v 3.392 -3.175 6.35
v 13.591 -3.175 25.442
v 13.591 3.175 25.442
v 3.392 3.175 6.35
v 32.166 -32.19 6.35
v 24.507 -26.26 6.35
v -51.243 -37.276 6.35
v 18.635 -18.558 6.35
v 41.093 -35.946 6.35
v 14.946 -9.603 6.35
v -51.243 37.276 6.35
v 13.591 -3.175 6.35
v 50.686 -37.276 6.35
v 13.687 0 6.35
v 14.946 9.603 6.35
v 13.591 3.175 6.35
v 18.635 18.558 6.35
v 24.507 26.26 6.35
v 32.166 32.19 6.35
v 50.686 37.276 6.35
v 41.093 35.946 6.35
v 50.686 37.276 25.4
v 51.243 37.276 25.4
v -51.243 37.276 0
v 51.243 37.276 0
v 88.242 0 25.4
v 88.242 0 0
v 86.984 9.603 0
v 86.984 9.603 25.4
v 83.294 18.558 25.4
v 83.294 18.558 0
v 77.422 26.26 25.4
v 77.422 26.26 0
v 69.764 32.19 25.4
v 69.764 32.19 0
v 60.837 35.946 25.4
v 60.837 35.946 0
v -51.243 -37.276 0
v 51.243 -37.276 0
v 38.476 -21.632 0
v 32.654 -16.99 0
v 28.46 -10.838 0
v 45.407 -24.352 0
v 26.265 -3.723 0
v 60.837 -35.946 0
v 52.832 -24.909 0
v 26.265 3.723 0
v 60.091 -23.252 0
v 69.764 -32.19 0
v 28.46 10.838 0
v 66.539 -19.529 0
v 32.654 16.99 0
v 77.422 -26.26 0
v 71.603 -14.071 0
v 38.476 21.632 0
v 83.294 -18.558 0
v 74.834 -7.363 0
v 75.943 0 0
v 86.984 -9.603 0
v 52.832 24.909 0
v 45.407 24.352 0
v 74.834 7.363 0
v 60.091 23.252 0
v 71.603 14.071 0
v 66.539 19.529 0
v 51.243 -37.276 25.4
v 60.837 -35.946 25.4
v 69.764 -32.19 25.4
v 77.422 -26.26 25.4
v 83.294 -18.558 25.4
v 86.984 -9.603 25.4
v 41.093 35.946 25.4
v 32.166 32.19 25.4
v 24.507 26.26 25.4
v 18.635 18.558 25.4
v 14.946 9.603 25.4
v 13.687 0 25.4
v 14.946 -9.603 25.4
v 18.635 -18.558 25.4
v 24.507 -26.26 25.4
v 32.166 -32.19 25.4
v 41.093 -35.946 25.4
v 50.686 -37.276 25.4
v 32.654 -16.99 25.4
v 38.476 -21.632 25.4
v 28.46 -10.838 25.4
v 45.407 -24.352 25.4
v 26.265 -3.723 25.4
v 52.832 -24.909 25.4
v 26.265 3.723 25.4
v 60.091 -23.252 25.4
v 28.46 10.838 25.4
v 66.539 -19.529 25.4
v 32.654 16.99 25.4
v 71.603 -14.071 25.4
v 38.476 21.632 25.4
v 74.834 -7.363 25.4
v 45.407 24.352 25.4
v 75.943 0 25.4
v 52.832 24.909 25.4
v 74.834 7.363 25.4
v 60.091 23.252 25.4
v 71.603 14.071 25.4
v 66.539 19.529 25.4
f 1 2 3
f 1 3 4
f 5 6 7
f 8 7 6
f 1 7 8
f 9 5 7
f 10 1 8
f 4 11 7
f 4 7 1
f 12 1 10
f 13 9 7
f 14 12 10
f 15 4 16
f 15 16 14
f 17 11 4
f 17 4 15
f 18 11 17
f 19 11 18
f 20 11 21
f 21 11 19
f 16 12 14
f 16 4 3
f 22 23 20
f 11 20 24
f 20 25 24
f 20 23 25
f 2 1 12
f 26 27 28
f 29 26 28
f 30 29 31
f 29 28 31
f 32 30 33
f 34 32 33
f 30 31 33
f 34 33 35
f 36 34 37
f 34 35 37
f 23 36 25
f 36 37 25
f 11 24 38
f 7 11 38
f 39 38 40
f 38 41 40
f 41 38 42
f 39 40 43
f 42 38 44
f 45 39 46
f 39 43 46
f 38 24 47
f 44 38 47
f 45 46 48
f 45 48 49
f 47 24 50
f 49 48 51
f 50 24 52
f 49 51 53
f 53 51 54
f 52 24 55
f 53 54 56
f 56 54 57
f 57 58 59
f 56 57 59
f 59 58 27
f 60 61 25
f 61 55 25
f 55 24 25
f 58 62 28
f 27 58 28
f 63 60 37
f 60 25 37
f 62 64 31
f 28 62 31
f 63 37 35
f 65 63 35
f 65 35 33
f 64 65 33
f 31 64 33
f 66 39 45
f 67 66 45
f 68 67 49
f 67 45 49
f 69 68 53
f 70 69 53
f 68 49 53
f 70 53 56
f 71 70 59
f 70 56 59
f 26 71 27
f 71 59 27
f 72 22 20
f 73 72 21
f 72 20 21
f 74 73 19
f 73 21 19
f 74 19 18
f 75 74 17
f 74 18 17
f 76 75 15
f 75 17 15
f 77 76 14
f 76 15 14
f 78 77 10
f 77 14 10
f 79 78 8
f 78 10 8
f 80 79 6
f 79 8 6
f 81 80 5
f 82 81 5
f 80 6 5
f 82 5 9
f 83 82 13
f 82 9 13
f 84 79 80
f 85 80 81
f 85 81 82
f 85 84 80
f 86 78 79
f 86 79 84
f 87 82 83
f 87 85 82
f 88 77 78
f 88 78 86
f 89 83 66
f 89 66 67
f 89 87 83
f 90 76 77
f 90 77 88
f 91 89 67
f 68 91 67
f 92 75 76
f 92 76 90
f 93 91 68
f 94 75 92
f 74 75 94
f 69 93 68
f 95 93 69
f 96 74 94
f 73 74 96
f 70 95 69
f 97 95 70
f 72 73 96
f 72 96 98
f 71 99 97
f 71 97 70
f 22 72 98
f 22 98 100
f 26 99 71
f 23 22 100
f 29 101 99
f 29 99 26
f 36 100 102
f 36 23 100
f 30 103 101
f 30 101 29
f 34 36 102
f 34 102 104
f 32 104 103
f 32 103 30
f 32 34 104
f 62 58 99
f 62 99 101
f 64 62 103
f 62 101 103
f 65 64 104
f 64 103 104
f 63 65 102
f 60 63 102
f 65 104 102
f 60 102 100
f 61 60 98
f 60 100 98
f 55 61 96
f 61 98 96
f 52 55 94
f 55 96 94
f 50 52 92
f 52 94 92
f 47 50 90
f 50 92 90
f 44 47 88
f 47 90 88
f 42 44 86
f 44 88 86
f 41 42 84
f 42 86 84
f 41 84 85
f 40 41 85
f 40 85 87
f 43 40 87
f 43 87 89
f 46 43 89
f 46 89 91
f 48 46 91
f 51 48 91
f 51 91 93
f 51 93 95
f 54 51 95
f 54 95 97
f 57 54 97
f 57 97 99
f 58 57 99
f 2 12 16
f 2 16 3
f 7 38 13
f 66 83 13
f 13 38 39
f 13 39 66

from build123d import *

# Parameters (mm, degrees)
F1_DEPTH = 25.4
F2_DEPTH = 6.35
F4_DEPTH = 3.175
F5_R     = 24.9785036256
F6_DEPTH = 89.916


with BuildPart() as f1:
    # F0 (on Top) → F1 (new body)
    with BuildSketch(Plane.XY):
        with BuildLine():
            Line((51.2434020638, 37.2763350606), (50.6863420601, 37.2763350606))
            ThreePointArc((50.6863420601, 37.2763350606), (13.6874964232, 0), (50.6863420601, -37.2763350606))
            Line((50.6863420601, -37.2763350606), (51.2434020638, -37.2763350606))
            Line((51.2434020638, -37.2763350606), (51.2434020638, 37.2763350606))
        make_face()
        with BuildLine():
            ThreePointArc((88.2422477007, 0), (77.4222491241, 26.2604252346), (51.2434020638, 37.2763350606))
            Line((51.2434020638, 37.2763350606), (51.2434020638, -37.2763350606))
            ThreePointArc((51.2434020638, -37.2763350606), (77.4222491241, -26.2604252346), (88.2422477007, 0))
        make_face()
    extrude(amount=F1_DEPTH)

    # F0 (on Top) → F2 (join)
    with BuildSketch(Plane.XY):
        with BuildLine():
            Line((50.6863420601, 37.2763350606), (-51.2434020638, 37.2763350606))
            Line((-51.2434020638, 37.2763350606), (-51.2434020638, -37.2763350606))
            Line((-51.2434020638, -37.2763350606), (50.6863420601, -37.2763350606))
            ThreePointArc((50.6863420601, -37.2763350606), (13.6874964232, 0), (50.6863420601, 37.2763350606))
        make_face()
    extrude(amount=F2_DEPTH)

    # F3 (on Front) → F4 (join, symmetric)
    with BuildSketch(Plane.XZ):
        Polygon((13.5906888172, 25.4415851086), (0, 0), (13.5906888172, 0), align=None)
    extrude(amount=F4_DEPTH, both=True)

    # F5 (on face) → F6 (cut)
    with BuildSketch(Plane.XY.offset(25.4)):
        with Locations((50.964872062, 0)):
            Circle(F5_R)
    extrude(amount=-F6_DEPTH, mode=Mode.SUBTRACT)


solid = f1.part
